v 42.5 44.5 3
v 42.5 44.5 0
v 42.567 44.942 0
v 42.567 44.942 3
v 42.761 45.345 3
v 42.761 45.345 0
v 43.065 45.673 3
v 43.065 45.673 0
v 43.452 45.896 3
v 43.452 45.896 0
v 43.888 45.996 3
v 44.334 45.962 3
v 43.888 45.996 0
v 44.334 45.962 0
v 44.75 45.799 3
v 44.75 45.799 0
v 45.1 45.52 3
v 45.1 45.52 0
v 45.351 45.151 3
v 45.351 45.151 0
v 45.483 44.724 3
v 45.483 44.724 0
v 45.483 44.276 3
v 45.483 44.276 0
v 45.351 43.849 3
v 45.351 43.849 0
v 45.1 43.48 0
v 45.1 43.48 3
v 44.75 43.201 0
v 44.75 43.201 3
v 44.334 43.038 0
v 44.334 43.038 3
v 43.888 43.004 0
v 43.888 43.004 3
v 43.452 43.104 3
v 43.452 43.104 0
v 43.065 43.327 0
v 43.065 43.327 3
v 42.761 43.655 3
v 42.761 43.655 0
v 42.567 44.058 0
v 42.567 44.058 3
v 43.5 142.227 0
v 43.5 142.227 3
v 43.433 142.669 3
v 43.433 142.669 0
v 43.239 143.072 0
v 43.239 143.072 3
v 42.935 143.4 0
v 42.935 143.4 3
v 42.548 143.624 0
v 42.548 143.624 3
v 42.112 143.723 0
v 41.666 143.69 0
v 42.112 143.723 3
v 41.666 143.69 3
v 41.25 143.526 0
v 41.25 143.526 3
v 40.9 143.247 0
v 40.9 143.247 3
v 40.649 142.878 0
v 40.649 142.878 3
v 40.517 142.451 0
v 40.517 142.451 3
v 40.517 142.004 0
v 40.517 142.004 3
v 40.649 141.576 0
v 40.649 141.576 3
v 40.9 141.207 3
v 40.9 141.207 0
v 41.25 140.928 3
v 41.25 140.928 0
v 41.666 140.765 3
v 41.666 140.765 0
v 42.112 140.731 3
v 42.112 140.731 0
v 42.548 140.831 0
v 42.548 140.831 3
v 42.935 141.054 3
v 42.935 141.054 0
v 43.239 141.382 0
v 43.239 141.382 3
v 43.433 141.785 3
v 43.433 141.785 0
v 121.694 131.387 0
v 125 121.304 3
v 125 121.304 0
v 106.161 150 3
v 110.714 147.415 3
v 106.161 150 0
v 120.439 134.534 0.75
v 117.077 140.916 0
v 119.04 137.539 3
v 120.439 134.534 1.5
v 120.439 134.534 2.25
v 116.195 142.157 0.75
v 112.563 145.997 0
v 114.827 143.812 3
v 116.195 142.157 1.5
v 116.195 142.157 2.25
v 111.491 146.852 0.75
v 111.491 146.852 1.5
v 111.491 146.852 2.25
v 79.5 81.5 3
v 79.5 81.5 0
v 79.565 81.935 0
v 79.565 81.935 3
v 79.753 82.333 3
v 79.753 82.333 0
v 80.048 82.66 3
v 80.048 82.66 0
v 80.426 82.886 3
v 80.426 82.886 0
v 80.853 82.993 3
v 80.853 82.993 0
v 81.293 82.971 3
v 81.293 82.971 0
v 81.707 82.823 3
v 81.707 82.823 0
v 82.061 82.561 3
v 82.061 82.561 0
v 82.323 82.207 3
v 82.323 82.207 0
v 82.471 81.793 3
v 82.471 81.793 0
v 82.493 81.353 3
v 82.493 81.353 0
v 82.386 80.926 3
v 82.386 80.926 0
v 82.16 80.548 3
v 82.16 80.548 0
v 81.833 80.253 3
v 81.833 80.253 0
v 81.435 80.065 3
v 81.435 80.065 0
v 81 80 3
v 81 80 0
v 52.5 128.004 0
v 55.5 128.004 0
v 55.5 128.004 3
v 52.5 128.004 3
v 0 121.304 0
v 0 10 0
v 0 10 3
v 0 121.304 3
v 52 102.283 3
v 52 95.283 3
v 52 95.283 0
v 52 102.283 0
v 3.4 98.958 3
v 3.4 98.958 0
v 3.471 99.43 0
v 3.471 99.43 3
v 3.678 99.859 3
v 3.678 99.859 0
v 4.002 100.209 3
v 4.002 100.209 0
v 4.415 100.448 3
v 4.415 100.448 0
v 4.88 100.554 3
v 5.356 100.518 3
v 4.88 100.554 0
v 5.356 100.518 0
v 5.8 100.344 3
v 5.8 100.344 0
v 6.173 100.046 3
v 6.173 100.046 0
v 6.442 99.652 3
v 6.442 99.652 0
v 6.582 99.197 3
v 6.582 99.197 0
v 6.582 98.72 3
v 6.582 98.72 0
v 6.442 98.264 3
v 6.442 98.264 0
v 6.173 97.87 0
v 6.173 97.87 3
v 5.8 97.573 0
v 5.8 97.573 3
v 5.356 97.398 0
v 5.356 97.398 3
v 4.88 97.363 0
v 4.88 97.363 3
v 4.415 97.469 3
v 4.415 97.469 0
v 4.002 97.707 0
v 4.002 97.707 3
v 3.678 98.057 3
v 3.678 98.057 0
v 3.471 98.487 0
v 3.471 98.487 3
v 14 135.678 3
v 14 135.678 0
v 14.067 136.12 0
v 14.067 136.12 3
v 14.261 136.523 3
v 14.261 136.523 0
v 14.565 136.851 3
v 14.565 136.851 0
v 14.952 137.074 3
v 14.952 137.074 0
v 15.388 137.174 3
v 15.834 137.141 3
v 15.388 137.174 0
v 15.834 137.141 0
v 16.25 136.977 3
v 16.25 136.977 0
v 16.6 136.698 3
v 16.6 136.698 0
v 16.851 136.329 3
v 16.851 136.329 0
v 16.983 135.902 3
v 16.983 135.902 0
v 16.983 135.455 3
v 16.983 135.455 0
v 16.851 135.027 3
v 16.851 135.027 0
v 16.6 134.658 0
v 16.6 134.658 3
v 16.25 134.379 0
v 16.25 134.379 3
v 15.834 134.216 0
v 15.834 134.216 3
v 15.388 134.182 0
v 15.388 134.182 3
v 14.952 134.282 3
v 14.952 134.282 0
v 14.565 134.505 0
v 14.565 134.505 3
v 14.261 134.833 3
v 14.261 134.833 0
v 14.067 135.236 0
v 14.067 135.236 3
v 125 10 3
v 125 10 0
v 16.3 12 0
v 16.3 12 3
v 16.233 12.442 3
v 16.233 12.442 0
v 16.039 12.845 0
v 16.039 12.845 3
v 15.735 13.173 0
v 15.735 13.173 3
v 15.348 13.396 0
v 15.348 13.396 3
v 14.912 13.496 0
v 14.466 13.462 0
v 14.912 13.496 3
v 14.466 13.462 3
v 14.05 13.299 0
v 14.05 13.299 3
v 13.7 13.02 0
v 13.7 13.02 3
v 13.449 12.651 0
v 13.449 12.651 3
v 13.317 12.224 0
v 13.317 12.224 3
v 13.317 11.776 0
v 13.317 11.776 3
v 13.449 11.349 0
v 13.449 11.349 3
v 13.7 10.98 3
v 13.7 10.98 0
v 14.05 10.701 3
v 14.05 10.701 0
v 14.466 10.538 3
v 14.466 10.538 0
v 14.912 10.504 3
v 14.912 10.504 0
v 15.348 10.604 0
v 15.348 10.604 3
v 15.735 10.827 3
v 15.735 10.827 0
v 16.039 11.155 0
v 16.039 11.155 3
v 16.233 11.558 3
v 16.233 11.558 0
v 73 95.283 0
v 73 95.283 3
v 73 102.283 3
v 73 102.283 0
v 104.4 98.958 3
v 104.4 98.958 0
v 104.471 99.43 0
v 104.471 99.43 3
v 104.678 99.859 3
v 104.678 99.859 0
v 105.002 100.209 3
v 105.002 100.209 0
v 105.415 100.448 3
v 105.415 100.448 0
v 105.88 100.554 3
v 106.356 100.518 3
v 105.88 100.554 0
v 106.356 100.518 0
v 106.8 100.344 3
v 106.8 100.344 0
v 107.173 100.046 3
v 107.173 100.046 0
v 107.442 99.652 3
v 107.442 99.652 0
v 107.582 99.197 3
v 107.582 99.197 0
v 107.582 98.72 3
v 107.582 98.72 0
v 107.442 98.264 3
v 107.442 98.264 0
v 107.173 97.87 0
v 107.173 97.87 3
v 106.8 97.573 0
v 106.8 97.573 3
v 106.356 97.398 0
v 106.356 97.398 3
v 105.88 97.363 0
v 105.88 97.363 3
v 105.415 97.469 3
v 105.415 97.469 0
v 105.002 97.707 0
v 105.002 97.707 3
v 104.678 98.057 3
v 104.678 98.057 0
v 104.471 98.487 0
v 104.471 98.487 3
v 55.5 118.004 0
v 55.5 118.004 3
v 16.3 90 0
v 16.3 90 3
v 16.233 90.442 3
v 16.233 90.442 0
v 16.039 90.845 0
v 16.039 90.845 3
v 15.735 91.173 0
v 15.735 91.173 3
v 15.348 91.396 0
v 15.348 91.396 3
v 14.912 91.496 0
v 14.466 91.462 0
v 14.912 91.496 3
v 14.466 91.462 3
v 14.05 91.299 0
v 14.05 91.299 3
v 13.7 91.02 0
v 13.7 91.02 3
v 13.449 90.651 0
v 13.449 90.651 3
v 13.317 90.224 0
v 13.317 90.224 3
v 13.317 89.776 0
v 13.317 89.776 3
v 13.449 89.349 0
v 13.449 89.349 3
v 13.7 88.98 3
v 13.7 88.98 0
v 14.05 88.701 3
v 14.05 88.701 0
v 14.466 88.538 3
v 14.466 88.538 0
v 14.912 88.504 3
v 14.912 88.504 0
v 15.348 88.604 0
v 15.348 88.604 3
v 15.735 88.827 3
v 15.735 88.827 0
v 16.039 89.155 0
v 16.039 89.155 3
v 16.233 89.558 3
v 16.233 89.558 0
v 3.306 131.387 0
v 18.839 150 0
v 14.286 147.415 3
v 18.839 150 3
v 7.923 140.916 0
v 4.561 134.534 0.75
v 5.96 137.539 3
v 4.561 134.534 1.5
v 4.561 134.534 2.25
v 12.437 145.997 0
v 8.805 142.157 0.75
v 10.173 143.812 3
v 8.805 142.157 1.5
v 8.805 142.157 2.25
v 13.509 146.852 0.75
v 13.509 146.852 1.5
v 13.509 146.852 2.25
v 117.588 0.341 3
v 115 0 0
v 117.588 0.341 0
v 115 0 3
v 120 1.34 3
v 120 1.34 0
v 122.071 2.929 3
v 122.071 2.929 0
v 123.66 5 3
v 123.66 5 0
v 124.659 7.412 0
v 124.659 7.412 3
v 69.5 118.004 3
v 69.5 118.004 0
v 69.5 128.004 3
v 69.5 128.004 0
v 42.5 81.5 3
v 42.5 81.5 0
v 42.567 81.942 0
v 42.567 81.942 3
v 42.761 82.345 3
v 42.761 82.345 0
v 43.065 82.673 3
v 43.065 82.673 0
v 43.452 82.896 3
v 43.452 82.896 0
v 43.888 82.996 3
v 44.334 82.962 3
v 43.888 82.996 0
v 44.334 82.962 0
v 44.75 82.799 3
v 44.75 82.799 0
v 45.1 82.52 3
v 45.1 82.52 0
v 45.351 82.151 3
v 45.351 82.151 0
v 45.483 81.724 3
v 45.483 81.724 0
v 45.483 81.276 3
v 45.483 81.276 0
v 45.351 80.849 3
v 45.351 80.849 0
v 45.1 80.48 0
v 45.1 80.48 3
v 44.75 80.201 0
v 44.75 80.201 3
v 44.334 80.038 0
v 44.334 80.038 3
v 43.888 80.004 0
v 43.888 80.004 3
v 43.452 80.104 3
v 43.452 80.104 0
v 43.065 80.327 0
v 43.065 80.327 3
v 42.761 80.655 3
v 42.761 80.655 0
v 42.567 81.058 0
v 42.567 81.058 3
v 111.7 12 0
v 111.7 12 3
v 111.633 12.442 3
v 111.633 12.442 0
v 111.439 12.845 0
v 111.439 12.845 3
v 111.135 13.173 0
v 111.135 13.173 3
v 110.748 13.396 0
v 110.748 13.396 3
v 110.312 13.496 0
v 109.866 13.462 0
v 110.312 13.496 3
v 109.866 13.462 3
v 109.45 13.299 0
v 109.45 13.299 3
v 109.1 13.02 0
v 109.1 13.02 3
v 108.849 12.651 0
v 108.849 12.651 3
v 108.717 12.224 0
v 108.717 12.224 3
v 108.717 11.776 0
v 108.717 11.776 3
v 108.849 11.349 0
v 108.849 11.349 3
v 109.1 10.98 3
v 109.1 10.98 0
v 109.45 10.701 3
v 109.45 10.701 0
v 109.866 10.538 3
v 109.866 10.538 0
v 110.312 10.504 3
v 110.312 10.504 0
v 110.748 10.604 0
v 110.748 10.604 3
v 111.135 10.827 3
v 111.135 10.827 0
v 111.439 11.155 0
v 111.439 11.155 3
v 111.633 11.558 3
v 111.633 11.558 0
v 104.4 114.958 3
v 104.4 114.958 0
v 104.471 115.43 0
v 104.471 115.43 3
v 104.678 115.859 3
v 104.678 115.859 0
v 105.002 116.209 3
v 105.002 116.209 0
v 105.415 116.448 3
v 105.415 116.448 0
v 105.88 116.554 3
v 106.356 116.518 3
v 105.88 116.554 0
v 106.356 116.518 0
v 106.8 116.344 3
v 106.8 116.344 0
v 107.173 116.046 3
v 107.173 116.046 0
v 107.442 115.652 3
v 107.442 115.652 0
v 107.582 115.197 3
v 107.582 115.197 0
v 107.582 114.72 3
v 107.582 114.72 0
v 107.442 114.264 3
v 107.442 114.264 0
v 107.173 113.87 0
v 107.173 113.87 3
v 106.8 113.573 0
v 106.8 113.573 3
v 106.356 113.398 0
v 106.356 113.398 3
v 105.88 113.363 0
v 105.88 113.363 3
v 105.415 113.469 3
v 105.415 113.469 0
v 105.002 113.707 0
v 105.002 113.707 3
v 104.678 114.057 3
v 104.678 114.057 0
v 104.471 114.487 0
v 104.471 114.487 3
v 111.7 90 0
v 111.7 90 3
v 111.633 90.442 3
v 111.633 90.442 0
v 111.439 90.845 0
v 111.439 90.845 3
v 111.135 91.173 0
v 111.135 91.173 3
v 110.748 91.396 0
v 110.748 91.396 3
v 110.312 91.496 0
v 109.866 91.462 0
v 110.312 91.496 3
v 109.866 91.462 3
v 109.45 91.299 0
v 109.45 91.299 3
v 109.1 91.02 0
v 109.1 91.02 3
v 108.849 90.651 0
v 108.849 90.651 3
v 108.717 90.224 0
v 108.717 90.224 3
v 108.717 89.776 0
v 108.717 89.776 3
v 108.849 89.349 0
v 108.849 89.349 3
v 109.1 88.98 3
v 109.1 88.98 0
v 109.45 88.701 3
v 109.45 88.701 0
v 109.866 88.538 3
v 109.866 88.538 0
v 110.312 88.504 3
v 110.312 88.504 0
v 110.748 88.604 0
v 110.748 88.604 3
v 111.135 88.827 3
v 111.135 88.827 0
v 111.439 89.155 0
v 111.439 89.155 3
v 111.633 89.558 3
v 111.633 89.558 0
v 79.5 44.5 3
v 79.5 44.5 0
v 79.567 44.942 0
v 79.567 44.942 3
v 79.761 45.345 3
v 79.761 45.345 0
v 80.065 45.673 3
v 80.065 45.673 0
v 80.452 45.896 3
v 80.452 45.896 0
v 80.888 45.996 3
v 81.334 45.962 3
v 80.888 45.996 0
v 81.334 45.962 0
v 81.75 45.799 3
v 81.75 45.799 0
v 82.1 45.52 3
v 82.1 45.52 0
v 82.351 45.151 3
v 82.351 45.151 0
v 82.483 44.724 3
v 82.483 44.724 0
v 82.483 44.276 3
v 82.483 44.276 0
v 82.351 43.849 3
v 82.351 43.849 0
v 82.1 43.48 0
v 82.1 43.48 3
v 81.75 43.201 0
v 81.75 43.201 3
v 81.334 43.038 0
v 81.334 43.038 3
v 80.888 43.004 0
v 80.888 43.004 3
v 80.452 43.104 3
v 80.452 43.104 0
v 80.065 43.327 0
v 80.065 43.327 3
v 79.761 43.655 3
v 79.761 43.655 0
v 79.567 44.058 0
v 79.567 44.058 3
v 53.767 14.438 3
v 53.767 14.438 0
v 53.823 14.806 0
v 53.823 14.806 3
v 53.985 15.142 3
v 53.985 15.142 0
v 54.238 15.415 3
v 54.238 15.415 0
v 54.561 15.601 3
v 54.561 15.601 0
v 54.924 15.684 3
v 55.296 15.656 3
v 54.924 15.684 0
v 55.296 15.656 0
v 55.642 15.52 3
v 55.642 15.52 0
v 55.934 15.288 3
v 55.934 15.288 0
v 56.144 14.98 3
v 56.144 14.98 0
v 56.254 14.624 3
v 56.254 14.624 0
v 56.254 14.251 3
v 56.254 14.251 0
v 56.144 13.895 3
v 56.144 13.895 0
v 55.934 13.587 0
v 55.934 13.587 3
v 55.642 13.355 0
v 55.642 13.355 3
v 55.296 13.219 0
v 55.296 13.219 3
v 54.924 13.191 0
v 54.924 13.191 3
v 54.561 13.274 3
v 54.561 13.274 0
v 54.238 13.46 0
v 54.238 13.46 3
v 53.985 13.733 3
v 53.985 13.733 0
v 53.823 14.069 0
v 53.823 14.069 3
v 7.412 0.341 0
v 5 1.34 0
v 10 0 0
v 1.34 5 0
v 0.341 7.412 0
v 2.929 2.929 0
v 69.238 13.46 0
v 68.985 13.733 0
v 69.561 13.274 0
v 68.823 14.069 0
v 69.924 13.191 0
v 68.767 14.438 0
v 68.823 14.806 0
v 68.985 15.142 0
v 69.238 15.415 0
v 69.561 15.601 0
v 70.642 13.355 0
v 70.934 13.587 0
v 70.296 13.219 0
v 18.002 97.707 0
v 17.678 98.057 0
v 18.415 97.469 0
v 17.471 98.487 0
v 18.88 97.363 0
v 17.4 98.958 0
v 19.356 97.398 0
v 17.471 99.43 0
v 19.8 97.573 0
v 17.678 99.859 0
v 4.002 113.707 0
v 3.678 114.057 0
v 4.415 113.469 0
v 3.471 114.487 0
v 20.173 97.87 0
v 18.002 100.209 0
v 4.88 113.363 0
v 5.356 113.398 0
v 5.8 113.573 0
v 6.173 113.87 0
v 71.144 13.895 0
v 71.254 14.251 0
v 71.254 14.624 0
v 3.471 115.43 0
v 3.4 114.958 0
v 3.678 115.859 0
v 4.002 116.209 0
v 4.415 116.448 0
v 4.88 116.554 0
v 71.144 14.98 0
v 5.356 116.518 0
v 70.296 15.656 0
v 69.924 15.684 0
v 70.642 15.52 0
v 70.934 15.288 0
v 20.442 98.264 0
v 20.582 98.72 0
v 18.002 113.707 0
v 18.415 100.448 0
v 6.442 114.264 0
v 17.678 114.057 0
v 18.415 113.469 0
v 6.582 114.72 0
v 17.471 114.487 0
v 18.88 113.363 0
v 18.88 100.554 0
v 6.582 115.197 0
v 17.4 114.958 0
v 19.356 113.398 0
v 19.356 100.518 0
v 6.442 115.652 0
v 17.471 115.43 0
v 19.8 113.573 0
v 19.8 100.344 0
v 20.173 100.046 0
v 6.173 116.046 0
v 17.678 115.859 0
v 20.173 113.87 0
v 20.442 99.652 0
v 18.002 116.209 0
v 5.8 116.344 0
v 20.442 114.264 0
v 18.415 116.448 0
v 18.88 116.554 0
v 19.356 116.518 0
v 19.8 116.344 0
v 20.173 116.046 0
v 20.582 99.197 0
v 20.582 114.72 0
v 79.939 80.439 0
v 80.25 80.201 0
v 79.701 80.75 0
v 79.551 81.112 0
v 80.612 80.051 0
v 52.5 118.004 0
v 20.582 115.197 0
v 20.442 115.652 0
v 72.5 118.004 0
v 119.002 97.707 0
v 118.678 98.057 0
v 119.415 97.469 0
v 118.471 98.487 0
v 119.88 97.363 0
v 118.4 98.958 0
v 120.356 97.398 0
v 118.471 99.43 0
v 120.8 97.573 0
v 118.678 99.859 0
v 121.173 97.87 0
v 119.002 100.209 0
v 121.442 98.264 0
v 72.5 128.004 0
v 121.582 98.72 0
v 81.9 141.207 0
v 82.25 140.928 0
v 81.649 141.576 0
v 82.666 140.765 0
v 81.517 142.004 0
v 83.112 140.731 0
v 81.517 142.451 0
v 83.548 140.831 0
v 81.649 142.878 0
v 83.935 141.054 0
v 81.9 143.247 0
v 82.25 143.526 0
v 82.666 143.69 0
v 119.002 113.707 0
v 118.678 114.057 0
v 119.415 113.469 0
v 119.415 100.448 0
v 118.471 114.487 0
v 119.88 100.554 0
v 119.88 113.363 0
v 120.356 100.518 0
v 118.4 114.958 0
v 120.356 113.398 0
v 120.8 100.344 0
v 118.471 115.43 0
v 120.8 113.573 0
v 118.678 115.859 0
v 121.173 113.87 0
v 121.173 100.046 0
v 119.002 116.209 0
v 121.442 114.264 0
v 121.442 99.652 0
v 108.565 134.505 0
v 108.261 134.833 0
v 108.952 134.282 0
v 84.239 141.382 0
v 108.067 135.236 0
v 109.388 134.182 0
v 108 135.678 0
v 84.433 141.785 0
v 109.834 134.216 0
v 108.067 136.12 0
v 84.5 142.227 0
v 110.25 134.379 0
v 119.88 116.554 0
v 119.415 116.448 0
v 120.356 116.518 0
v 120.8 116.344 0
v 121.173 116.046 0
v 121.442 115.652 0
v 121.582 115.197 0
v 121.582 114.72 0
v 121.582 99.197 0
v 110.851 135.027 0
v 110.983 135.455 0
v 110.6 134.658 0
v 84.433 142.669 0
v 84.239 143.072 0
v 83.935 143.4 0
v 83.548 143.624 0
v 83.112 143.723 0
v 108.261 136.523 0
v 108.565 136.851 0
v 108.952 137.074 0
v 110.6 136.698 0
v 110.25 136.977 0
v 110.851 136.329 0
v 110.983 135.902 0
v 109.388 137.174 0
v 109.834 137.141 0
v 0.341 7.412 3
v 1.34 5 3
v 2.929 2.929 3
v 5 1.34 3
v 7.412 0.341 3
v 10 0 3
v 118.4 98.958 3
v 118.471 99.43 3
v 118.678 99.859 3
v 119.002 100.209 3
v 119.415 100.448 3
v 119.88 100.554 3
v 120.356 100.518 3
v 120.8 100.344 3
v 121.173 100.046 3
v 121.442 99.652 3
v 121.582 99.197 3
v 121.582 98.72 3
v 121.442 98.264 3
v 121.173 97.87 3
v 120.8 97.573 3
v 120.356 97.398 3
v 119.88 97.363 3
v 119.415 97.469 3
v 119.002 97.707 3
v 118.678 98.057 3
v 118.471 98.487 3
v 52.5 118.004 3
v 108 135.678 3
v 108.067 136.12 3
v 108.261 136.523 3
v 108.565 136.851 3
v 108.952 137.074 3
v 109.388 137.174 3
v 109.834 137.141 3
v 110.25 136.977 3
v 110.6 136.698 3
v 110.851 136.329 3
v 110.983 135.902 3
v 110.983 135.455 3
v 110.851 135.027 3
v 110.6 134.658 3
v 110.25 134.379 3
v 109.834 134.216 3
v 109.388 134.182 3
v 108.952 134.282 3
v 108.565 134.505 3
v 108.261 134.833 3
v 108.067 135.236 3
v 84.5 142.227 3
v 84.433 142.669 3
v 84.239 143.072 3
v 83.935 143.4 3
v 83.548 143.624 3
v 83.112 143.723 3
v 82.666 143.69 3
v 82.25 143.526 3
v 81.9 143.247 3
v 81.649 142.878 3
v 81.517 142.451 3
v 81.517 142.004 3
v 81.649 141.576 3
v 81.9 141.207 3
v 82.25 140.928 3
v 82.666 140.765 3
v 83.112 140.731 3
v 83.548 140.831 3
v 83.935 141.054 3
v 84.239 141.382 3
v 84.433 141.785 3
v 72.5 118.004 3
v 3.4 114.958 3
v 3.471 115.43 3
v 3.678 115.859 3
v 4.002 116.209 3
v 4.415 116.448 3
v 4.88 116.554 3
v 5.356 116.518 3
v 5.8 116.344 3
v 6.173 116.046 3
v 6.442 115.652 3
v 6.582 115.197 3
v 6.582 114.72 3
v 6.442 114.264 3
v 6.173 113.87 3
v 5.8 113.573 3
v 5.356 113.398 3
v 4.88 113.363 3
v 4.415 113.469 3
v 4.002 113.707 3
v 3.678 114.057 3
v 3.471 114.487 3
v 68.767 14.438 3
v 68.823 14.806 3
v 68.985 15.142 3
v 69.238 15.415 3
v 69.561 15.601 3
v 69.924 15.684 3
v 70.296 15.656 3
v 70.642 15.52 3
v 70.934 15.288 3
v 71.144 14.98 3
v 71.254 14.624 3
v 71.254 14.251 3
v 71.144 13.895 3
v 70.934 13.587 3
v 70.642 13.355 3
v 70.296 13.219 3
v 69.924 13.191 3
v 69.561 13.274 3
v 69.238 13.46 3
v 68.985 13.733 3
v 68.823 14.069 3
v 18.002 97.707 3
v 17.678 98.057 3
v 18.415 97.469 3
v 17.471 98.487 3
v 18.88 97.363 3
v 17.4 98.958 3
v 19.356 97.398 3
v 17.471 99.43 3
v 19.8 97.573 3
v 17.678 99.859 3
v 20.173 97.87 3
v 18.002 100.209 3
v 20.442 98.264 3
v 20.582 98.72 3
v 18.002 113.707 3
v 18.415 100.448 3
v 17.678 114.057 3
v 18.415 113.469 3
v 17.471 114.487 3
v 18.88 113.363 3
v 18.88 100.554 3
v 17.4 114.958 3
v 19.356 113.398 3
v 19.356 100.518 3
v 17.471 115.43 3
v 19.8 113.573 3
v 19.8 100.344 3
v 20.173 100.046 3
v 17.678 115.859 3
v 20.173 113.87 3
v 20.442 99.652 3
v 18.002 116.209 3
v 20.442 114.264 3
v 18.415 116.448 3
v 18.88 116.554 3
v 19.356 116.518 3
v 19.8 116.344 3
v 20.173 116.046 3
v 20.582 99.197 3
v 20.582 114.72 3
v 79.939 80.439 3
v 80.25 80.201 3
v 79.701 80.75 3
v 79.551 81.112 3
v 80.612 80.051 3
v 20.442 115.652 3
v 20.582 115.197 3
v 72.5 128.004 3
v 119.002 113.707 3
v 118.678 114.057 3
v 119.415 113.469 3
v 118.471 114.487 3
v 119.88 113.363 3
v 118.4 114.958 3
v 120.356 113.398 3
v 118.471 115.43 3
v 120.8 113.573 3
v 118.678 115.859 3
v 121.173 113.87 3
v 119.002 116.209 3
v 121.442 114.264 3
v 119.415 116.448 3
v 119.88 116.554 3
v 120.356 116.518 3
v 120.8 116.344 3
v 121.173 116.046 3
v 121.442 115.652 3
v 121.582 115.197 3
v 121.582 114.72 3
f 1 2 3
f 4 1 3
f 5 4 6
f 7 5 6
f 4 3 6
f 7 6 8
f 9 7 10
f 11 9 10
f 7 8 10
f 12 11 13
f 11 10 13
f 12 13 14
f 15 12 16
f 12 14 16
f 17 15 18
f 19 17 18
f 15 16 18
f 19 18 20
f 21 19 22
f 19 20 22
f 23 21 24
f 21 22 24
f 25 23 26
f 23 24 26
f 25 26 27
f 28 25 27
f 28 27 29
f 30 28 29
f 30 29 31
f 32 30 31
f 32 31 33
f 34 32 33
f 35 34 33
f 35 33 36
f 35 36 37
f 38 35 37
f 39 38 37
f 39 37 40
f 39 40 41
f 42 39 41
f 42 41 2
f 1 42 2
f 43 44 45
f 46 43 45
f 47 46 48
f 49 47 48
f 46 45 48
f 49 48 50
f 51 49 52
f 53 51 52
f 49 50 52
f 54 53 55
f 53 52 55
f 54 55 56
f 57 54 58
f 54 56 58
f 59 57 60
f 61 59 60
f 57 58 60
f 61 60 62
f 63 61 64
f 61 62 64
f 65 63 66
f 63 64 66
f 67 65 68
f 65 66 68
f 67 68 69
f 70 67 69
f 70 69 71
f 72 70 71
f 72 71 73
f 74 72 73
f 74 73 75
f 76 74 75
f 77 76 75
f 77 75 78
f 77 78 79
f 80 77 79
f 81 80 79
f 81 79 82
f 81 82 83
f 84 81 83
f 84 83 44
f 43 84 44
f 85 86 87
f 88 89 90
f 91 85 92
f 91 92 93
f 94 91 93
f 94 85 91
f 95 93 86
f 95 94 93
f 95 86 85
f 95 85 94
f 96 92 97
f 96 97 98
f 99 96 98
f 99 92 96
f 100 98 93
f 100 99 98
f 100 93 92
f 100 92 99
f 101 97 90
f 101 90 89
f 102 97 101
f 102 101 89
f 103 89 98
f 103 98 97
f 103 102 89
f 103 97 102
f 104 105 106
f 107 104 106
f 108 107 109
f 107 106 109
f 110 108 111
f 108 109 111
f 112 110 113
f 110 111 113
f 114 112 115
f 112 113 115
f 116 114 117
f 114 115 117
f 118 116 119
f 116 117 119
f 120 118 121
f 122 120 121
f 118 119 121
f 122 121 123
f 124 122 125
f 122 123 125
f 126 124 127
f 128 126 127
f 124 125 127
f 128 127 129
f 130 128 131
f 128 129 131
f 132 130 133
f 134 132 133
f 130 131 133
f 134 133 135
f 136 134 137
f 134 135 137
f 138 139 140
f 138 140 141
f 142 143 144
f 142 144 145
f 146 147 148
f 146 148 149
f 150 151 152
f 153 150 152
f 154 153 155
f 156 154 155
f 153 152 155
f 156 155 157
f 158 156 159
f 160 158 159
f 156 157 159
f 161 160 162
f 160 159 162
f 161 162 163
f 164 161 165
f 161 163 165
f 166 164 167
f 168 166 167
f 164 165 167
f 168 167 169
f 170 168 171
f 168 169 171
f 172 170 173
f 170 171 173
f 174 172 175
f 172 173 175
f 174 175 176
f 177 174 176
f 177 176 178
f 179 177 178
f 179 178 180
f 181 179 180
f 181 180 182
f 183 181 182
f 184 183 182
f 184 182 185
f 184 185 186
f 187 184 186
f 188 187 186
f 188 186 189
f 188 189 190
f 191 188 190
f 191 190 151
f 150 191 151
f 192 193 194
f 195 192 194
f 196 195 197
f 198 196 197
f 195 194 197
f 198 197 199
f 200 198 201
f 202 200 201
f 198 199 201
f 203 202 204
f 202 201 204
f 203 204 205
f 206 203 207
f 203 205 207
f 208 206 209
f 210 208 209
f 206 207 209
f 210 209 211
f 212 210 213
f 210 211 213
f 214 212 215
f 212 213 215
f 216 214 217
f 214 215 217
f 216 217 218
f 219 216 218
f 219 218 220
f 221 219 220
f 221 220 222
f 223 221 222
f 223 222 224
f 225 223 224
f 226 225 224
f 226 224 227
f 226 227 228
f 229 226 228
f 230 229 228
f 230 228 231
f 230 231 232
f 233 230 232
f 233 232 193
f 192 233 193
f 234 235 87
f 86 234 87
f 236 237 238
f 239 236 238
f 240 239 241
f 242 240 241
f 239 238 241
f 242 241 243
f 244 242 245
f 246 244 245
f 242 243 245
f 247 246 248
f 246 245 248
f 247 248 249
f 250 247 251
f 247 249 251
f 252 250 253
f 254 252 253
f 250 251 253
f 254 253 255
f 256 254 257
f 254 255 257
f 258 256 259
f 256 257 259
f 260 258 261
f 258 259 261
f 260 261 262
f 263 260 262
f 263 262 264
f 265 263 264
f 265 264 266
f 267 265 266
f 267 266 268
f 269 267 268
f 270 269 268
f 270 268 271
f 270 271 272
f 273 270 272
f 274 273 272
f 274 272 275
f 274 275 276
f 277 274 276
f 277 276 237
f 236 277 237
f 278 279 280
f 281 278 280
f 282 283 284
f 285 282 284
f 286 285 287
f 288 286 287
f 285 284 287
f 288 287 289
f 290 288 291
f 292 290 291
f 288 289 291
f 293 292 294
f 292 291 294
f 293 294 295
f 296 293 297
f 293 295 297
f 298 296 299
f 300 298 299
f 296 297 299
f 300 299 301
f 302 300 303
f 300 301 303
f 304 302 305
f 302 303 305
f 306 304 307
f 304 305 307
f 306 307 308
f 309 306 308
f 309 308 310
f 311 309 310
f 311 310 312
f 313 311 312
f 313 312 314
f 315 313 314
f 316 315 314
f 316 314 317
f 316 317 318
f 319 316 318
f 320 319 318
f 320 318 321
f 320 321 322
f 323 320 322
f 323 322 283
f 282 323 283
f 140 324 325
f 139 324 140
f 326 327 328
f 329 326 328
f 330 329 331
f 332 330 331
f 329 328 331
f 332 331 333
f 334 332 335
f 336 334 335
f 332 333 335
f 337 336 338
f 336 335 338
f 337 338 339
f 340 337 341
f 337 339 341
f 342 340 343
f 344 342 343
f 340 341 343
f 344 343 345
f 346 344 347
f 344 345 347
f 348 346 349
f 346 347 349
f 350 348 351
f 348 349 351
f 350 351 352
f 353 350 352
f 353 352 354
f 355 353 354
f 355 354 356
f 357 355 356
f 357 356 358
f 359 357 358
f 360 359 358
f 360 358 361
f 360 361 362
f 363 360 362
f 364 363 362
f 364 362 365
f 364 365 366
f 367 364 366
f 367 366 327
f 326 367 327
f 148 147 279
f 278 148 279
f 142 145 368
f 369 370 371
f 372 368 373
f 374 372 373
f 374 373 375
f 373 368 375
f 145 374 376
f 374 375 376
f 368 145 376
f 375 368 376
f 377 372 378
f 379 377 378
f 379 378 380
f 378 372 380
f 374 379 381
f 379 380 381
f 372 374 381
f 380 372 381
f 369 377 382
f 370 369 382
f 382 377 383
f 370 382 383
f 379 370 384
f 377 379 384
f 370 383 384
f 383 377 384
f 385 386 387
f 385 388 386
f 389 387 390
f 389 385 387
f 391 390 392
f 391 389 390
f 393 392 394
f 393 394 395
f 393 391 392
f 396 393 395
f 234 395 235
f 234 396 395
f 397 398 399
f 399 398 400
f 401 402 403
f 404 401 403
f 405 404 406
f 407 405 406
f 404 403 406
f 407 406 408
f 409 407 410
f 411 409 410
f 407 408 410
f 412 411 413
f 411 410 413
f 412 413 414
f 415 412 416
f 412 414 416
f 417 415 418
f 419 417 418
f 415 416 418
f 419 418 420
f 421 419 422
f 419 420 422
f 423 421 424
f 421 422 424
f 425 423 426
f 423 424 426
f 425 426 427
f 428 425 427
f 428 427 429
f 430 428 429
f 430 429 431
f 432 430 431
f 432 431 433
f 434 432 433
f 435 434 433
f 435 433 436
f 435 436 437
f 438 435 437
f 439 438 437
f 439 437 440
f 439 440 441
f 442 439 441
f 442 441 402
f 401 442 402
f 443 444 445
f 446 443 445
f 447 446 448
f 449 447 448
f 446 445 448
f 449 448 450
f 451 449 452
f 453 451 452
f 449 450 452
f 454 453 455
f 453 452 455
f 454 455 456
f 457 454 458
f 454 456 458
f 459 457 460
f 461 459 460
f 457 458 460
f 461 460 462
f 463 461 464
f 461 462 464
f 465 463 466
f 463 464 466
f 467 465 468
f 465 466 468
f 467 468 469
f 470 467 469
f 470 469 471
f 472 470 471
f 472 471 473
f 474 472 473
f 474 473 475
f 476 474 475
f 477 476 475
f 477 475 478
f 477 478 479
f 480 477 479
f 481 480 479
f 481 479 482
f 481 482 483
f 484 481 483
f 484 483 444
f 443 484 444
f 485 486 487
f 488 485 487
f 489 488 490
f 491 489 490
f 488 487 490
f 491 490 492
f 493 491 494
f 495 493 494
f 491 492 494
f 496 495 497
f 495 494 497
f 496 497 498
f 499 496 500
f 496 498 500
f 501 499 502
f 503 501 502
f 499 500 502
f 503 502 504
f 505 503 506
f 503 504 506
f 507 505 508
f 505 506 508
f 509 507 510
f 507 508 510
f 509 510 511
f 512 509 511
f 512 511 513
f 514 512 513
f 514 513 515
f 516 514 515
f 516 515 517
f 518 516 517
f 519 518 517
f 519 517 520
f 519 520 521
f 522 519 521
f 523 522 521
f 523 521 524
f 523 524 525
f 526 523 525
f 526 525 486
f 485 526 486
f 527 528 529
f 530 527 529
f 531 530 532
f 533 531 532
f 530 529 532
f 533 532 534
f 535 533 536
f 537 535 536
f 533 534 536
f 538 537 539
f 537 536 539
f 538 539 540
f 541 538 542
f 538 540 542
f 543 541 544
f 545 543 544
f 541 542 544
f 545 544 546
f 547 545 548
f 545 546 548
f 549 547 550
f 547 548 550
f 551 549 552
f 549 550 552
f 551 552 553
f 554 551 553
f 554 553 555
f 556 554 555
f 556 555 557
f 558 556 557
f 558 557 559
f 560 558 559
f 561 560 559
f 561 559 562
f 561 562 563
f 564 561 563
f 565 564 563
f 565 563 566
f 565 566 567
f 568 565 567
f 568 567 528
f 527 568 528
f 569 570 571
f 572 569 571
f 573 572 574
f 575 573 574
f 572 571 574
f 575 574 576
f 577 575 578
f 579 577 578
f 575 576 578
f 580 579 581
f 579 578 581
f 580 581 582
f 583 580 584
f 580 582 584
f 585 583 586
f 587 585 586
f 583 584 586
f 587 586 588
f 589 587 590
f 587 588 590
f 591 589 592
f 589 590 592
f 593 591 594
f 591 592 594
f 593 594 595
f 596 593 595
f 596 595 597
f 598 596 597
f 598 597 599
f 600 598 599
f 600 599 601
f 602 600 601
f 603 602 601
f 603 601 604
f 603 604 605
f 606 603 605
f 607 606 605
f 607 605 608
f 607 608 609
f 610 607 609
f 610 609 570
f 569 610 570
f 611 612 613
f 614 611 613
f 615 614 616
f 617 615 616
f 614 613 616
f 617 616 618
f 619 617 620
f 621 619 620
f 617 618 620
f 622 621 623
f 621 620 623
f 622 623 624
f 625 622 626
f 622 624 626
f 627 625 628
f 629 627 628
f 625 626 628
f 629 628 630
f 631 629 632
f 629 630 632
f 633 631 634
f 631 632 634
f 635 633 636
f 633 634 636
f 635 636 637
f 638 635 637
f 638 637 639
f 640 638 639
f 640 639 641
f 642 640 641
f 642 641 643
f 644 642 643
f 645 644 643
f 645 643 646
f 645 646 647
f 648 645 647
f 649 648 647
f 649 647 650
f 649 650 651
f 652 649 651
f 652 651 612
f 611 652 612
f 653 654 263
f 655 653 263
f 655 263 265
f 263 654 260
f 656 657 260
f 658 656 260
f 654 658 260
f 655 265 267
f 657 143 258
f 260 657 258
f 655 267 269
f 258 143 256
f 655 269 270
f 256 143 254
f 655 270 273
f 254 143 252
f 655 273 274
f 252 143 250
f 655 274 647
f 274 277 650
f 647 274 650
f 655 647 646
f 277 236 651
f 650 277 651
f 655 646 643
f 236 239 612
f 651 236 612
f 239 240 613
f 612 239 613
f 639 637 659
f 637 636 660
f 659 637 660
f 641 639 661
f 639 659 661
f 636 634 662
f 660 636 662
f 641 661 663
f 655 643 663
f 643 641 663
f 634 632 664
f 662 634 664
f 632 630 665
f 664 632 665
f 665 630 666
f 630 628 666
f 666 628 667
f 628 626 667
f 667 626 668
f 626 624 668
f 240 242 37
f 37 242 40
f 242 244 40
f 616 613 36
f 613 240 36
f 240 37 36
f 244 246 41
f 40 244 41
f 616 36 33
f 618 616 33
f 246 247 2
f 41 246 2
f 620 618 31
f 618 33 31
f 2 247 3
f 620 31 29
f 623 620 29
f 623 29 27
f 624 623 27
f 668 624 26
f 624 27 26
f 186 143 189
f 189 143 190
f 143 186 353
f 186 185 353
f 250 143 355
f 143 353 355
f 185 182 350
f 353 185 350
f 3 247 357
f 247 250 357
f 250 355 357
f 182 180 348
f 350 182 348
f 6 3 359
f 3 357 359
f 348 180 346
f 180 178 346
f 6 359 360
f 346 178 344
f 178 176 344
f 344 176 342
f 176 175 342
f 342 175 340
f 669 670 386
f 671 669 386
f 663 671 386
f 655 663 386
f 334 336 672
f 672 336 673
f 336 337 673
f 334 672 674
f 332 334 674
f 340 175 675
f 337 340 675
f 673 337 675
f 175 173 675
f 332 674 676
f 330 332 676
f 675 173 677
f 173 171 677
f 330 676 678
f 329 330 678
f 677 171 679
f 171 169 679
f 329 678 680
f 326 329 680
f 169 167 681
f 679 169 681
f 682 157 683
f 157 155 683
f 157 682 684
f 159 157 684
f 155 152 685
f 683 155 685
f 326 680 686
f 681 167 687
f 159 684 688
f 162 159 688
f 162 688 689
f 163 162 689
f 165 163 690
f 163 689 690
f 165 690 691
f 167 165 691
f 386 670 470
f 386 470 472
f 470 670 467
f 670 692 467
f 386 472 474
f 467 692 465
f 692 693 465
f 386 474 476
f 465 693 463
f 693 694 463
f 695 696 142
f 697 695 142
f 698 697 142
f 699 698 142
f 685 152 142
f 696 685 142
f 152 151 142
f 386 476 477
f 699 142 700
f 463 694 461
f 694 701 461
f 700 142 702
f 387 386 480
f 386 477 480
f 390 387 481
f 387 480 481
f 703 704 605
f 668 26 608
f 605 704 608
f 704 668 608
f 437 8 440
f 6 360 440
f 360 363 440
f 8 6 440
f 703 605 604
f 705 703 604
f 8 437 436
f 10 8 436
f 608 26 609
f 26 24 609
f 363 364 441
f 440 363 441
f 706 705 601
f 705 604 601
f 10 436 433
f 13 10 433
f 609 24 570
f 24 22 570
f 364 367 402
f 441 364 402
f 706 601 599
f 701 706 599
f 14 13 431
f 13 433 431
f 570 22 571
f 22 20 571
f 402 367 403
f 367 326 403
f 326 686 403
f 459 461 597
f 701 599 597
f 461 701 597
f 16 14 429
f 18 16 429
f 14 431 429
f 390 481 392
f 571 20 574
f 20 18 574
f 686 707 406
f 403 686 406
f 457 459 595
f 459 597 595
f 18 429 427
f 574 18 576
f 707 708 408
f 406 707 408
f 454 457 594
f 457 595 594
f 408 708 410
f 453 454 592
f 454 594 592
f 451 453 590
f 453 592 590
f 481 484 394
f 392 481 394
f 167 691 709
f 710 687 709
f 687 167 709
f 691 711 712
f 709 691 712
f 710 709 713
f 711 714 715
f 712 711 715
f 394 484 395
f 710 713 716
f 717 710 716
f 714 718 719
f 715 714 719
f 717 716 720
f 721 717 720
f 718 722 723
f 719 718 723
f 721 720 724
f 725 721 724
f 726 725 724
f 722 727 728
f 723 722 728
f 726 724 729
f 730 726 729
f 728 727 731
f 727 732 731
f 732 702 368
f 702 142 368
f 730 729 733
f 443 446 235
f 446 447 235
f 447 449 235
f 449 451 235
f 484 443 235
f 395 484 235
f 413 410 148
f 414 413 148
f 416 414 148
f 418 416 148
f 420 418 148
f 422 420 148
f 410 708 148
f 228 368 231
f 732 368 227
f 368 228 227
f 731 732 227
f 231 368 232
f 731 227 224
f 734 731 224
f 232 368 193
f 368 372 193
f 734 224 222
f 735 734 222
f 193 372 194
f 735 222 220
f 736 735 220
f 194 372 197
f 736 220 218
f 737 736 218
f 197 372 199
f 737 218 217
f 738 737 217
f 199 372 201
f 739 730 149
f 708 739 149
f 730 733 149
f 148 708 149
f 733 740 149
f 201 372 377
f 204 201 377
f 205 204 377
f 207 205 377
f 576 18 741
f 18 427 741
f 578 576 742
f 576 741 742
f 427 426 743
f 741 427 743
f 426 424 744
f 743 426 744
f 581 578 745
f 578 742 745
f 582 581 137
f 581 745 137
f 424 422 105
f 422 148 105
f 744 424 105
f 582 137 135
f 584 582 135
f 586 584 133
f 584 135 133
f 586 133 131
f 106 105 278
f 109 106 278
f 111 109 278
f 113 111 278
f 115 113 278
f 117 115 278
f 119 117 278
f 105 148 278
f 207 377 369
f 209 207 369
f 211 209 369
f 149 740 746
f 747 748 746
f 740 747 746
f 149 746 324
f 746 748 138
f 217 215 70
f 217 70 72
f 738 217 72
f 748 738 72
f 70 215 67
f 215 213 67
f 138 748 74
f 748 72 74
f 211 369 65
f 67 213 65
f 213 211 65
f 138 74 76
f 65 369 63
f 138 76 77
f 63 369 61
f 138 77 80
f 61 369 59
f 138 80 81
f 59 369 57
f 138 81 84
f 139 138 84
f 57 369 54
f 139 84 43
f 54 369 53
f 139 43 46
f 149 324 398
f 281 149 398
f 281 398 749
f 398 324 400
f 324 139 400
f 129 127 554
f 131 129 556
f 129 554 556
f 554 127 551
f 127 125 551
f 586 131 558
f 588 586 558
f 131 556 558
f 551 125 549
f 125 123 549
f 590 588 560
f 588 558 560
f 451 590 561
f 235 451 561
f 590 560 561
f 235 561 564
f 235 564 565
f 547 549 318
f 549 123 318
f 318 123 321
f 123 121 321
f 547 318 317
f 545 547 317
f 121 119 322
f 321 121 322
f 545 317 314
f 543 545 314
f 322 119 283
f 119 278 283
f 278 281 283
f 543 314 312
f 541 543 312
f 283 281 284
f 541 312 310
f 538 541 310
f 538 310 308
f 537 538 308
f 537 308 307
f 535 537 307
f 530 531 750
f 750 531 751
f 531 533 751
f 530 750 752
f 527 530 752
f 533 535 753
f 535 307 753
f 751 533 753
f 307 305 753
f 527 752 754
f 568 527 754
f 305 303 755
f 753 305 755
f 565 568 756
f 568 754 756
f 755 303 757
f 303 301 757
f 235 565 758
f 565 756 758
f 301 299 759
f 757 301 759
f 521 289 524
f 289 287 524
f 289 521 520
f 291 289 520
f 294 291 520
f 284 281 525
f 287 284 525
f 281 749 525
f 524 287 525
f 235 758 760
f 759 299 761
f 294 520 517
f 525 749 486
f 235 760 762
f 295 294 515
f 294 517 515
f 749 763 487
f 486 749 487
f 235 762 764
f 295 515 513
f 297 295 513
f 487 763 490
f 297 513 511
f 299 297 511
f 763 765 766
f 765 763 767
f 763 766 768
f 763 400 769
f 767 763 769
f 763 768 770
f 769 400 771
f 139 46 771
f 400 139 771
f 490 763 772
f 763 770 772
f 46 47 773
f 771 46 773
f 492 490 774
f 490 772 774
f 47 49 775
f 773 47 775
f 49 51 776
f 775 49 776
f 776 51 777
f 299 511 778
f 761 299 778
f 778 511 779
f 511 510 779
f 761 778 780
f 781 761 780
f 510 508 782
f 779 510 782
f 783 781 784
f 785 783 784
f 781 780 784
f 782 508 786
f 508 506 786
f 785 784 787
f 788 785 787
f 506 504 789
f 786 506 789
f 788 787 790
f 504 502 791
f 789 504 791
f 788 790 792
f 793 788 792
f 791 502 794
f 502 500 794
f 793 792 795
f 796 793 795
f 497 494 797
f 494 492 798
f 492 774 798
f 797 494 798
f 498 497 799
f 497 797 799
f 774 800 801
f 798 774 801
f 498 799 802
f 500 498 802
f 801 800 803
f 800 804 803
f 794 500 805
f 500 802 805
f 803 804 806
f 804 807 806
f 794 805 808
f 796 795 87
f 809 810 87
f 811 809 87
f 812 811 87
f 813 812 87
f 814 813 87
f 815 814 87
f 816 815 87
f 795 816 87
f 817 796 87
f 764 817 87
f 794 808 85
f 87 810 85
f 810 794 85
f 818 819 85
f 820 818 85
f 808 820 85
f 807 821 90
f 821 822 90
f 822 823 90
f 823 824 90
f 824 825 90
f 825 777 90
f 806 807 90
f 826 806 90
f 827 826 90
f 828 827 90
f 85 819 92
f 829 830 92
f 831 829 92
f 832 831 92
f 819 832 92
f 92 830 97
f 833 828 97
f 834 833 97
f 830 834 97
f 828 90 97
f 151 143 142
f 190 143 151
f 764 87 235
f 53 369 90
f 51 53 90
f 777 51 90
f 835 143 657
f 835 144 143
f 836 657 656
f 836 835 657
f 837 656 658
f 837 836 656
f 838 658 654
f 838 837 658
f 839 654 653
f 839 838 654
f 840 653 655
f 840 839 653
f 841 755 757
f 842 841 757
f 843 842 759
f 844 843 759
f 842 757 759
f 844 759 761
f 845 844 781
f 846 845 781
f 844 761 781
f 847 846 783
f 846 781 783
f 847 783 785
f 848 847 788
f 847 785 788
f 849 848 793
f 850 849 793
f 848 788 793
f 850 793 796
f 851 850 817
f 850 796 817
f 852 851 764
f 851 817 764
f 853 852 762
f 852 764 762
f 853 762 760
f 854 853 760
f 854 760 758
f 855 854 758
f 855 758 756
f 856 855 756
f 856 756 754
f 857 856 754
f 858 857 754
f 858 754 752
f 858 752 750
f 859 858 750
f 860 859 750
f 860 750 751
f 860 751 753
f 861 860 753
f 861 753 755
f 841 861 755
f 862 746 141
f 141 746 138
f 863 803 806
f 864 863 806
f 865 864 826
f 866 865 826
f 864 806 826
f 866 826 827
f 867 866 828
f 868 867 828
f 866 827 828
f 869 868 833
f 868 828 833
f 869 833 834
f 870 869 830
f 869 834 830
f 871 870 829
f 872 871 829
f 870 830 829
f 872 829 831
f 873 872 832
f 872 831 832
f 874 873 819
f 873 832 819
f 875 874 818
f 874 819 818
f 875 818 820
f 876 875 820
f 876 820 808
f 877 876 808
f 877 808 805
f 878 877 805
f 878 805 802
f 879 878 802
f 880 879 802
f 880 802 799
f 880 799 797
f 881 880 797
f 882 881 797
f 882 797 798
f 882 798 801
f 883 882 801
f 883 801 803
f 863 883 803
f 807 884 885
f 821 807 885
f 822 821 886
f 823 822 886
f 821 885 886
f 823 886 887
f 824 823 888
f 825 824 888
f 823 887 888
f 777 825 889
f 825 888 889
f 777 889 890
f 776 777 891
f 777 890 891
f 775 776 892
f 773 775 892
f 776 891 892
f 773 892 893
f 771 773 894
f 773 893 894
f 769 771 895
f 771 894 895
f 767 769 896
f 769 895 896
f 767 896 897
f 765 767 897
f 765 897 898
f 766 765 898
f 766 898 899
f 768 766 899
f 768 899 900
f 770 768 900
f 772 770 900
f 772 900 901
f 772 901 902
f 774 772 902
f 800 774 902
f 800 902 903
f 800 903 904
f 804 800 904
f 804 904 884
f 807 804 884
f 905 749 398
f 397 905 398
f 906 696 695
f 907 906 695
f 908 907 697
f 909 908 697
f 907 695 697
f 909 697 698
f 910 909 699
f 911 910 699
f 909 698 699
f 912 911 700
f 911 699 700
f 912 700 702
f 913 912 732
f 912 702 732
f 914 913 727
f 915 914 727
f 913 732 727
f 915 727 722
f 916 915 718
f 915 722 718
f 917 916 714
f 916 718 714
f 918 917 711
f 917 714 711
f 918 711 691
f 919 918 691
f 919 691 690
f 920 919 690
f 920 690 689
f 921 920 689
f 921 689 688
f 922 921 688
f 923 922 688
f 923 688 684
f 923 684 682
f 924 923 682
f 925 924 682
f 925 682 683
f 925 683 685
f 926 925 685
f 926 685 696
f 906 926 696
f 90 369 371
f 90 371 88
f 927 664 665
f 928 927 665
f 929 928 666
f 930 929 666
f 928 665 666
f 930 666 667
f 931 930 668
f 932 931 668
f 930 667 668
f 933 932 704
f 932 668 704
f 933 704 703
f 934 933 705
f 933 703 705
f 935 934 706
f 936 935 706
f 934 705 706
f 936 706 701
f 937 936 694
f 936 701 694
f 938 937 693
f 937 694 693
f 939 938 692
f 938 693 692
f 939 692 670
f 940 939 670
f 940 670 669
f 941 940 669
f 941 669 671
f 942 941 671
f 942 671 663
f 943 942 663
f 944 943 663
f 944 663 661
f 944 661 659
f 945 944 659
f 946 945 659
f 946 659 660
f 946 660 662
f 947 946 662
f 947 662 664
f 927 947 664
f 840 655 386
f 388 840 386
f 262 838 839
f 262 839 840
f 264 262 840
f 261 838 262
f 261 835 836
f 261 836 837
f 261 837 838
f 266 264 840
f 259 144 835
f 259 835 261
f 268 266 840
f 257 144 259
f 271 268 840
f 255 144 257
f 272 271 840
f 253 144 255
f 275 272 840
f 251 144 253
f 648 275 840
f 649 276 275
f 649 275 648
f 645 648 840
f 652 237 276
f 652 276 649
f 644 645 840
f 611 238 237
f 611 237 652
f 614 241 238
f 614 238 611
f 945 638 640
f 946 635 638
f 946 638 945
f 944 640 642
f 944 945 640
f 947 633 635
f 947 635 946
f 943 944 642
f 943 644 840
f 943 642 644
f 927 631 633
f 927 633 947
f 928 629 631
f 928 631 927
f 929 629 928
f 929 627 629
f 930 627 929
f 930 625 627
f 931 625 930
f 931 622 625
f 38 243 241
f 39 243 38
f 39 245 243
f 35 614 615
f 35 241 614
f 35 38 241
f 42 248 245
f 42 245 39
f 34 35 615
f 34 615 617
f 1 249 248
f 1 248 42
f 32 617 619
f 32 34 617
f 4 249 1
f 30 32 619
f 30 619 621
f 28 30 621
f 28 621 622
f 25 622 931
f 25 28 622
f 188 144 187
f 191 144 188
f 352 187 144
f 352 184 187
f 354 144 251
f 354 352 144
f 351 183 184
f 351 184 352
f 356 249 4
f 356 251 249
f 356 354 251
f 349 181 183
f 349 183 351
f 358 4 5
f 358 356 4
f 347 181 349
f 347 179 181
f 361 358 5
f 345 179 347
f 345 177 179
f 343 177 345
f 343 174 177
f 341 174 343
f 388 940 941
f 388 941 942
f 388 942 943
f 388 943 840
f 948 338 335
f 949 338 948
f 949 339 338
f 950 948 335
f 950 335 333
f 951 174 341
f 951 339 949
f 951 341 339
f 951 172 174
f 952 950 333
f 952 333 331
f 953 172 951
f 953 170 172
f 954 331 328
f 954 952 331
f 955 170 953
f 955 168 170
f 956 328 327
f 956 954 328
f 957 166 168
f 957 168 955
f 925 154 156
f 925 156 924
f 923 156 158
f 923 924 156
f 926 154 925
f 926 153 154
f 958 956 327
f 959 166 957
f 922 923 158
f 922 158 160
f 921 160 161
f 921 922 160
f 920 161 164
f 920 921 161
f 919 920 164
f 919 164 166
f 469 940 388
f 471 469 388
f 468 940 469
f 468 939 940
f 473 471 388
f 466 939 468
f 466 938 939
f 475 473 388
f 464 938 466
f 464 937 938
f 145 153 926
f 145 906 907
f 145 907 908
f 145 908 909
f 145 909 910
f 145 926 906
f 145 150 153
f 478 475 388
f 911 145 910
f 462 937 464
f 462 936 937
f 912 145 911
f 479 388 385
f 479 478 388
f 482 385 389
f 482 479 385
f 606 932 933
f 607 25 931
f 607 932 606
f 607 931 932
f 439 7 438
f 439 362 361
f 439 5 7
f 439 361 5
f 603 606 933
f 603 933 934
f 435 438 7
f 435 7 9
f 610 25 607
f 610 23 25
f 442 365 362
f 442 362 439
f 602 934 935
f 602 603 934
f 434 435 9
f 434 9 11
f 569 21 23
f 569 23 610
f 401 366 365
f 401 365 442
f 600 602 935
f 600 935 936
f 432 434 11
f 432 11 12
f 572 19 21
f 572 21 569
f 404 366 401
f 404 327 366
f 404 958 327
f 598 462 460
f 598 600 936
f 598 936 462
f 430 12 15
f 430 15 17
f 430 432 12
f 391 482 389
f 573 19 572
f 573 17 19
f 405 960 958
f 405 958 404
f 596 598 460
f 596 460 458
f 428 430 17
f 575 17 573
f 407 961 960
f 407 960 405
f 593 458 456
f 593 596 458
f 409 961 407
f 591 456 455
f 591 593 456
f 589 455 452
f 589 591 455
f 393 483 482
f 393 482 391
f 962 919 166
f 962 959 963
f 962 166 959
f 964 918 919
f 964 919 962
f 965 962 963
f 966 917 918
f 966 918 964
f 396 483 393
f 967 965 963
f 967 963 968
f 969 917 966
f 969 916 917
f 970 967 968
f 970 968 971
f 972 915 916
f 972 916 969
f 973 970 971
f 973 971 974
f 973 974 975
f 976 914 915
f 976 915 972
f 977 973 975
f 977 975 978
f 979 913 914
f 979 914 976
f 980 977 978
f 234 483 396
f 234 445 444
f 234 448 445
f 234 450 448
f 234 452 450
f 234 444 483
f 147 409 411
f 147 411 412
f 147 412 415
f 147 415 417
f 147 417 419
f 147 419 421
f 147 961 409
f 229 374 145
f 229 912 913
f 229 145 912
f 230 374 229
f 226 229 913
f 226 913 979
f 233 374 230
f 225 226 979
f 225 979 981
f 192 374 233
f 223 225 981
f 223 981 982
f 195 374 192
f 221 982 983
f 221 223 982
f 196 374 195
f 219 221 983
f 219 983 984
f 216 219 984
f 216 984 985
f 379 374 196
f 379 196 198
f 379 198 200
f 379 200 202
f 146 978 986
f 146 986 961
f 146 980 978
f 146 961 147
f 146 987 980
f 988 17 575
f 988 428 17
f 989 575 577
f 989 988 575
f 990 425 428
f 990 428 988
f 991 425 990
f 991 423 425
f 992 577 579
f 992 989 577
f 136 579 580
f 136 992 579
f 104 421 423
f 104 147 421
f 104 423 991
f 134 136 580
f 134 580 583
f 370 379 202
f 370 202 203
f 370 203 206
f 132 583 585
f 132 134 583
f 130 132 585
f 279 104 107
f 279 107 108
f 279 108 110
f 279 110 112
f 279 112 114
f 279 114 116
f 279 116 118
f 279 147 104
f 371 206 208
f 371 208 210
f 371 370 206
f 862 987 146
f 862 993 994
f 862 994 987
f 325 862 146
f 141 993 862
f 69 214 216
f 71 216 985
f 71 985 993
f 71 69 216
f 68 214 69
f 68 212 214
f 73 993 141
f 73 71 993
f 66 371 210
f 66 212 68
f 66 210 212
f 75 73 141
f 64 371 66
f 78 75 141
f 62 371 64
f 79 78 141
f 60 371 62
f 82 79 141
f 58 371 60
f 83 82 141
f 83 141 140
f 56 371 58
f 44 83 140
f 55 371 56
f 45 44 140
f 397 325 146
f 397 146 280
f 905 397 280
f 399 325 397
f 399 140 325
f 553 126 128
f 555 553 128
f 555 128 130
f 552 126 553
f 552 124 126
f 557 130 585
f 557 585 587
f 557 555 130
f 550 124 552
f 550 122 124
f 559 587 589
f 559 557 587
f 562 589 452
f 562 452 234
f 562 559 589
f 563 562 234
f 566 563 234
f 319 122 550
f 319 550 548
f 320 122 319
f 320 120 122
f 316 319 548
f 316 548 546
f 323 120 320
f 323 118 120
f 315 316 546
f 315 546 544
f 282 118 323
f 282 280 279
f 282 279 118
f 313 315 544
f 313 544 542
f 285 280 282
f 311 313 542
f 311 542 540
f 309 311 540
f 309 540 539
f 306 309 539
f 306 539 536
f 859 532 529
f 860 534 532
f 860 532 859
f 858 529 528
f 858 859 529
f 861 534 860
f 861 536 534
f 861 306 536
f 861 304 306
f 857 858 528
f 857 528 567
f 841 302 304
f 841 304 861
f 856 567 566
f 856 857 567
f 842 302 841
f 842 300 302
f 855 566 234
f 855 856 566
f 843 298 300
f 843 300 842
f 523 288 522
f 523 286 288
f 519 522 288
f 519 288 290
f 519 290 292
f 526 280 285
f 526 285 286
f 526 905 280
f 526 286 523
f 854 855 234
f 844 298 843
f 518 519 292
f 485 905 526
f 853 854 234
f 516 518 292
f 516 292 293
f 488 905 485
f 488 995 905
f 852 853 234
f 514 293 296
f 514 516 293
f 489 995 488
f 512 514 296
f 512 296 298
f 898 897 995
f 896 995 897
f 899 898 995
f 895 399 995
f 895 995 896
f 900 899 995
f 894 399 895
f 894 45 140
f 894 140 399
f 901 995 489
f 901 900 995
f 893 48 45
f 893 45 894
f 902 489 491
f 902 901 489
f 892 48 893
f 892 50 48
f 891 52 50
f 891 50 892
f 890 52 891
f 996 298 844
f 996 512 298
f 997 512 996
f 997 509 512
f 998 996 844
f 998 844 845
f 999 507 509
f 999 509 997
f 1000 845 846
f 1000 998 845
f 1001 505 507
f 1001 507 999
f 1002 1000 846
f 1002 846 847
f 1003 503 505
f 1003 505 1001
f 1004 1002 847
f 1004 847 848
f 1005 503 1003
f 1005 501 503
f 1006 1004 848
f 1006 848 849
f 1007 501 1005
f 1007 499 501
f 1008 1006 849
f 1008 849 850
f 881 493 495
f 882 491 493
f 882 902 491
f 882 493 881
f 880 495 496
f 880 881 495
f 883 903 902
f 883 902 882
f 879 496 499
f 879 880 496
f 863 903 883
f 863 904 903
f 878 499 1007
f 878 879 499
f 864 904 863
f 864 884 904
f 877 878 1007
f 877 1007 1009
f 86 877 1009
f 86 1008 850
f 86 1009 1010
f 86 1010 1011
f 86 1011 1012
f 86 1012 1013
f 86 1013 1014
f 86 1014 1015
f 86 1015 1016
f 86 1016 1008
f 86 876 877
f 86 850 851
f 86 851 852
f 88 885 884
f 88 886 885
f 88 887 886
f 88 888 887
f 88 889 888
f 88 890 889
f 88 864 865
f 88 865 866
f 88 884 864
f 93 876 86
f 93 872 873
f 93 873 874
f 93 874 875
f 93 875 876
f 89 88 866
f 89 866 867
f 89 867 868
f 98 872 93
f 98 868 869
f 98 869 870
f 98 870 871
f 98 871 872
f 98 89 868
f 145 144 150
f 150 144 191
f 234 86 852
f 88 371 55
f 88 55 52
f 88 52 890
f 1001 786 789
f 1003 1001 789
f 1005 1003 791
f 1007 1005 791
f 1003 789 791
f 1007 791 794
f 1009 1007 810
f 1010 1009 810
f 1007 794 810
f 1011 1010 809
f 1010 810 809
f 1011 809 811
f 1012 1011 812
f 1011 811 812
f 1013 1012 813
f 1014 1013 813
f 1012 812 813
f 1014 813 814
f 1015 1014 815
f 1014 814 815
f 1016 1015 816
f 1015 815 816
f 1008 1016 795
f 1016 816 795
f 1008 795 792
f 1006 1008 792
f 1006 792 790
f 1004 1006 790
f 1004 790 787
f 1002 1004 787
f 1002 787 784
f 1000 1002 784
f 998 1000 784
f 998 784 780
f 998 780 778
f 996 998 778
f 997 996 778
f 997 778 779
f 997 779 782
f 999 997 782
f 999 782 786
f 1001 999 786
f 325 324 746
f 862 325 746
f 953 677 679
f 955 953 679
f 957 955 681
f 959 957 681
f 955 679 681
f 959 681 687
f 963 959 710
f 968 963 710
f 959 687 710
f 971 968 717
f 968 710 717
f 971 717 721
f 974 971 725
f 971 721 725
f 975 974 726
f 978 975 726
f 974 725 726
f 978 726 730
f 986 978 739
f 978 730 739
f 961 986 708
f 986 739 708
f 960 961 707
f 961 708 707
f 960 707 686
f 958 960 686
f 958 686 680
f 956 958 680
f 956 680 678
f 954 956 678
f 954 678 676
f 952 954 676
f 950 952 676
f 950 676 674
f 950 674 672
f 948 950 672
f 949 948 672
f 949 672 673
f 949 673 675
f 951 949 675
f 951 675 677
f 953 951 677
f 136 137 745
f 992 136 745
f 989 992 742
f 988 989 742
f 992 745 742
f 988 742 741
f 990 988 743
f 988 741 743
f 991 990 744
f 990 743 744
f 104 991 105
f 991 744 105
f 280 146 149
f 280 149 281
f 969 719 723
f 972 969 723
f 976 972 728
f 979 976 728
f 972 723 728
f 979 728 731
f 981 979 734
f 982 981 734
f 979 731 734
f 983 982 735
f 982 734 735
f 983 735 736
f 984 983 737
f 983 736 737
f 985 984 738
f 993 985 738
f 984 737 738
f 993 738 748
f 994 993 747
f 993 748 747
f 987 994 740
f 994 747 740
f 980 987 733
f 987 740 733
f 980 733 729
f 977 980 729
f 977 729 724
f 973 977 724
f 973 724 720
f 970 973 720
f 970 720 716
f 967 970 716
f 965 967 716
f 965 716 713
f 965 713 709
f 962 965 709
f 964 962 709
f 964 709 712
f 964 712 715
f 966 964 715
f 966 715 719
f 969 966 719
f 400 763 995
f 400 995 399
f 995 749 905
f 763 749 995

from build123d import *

# Parameters (mm, degrees)
SKETCH1_W           = 125
SKETCH1_H           = 150
BOSS_EXTRUDE1_DEPTH = 3
SKETCH2_R           = 1.6
CUT_EXTRUDE1_DEPTH  = 4
SKETCH3_R           = 1.5
CUT_EXTRUDE2_DEPTH  = 4
SKETCH4_R           = 1.25
CUT_EXTRUDE3_DEPTH  = 4
SKETCH5_W           = 3
SKETCH5_H           = 10
CUT_EXTRUDE4_DEPTH  = 4
SKETCH6_R           = 1.5
CUT_EXTRUDE5_DEPTH  = 4
CUT_EXTRUDE6_DEPTH  = 4
SKETCH8_R           = 1.5
CUT_EXTRUDE7_DEPTH  = 4.0000001
SKETCH9_R           = 1.5
CUT_EXTRUDE8_DEPTH  = 4.0000001
FILLET3_R           = 10
SKETCH10_W          = 21
SKETCH10_H          = 7
CUT_EXTRUDE9_DEPTH  = 4.0000001


with BuildPart() as part:
    # Sketch1 → Boss-Extrude1 (new body)
    with BuildSketch(Plane.XY):
        with Locations((62.5, 75)):
            Rectangle(SKETCH1_W, SKETCH1_H)
    extrude(amount=BOSS_EXTRUDE1_DEPTH)

    # Sketch2 → Cut-Extrude1 (cut, through all)
    with BuildSketch(Plane(origin=(0, 0, 0), x_dir=(-1, 0, 0), z_dir=(0, 0, -1))):
        with Locations((-120, 114.958148689)):
            Circle(SKETCH2_R)
        with Locations((-106, 114.958148689)):
            Circle(SKETCH2_R)
        with Locations((-106, 98.958148689)):
            Circle(SKETCH2_R)
        with Locations((-120, 98.958148689)):
            Circle(SKETCH2_R)
        with Locations((-19, 114.958148689)):
            Circle(SKETCH2_R)
        with Locations((-5, 114.958148689)):
            Circle(SKETCH2_R)
        with Locations((-5, 98.958148689)):
            Circle(SKETCH2_R)
        with Locations((-19, 98.958148689)):
            Circle(SKETCH2_R)
    extrude(amount=-CUT_EXTRUDE1_DEPTH, mode=Mode.SUBTRACT)

    # Sketch3 → Cut-Extrude2 (cut, through all)
    with BuildSketch(Plane(origin=(0, 0, 0), x_dir=(-1, 0, 0), z_dir=(0, 0, -1))):
        with BuildLine():
            ThreePointArc((-79.5, 81.5), (-82.060660172, 82.560660172), (-81, 80))
            Line((-81, 80), (-81, 81.5))
            Line((-81, 81.5), (-79.5, 81.5))
        make_face()
        with BuildLine():
            Line((-81, 81.5), (-81, 80))
            ThreePointArc((-81, 80), (-79.939339828, 80.439339828), (-79.5, 81.5))
            Line((-79.5, 81.5), (-81, 81.5))
        make_face()
        with Locations((-44, 81.5)):
            Circle(SKETCH3_R)
        with Locations((-81, 44.5)):
            Circle(SKETCH3_R)
        with Locations((-44, 44.5)):
            Circle(SKETCH3_R)
    extrude(amount=-CUT_EXTRUDE2_DEPTH, mode=Mode.SUBTRACT)

    # Sketch4 → Cut-Extrude3 (cut, through all)
    with BuildSketch(Plane(origin=(0, 0, 0), x_dir=(-1, 0, 0), z_dir=(0, 0, -1))):
        with Locations((-70.017473816, 14.43752637)):
            Circle(SKETCH4_R)
        with Locations((-55.017473816, 14.43752637)):
            Circle(SKETCH4_R)
    extrude(amount=-CUT_EXTRUDE3_DEPTH, mode=Mode.SUBTRACT)

    # Sketch5 → Cut-Extrude4 (cut, through all)
    with BuildSketch(Plane(origin=(0, 0, 0), x_dir=(-1, 0, 0), z_dir=(0, 0, -1))):
        with Locations((-54, 123.004295886)):
            Rectangle(SKETCH5_W, SKETCH5_H)
        with Locations((-71, 123.004295886)):
            Rectangle(SKETCH5_W, SKETCH5_H)
    extrude(amount=-CUT_EXTRUDE4_DEPTH, mode=Mode.SUBTRACT)

    # Sketch6 → Cut-Extrude5 (cut, through all)
    with BuildSketch(Plane(origin=(0, 0, 0), x_dir=(-1, 0, 0), z_dir=(0, 0, -1))):
        with Locations((-15.5, 135.678181118)):
            Circle(SKETCH6_R)
        with Locations((-109.5, 135.678181118)):
            Circle(SKETCH6_R)
    extrude(amount=-CUT_EXTRUDE5_DEPTH, mode=Mode.SUBTRACT)

    # Sketch7 → Cut-Extrude6 (cut, through all)
    with BuildSketch(Plane.XY.offset(3)):
        with BuildLine():
            Line((18.83856041, 150), (0, 150))
            Line((0, 150), (0, 121.303805561))
            add(Edge.make_bspline(
                [(0, 121.303805561), (5.130729703, 138.554109372), (8.057120528, 143.174726465), (13.293819899, 147.487302418), (18.83856041, 150)],
                knots=[0, 0, 0, 0, 0, 1, 1, 1, 1, 1], degree=4))
        make_face()
        with BuildLine():
            Line((125, 150), (125, 121.303805561))
            add(Edge.make_bspline(
                [(125, 121.303805561), (119.869270297, 138.554109372), (116.942879472, 143.174726465), (111.706180101, 147.487302418), (106.16143959, 150)],
                knots=[0, 0, 0, 0, 0, 1, 1, 1, 1, 1], degree=4))
            Line((106.16143959, 150), (125, 150))
        make_face()
    extrude(amount=-CUT_EXTRUDE6_DEPTH, mode=Mode.SUBTRACT)

    # Sketch8 → Cut-Extrude7 (cut, through all)
    with BuildSketch(Plane.XY.offset(3)):
        with Locations((14.8, 12)):
            Circle(SKETCH8_R)
        with Locations((110.2, 12)):
            Circle(SKETCH8_R)
        with Locations((14.8, 90)):
            Circle(SKETCH8_R)
        with Locations((110.2, 90)):
            Circle(SKETCH8_R)
    extrude(amount=-CUT_EXTRUDE7_DEPTH, mode=Mode.SUBTRACT)

    # Sketch9 → Cut-Extrude8 (cut, through all)
    with BuildSketch(Plane.XY.offset(3)):
        with Locations((42, 142.227223386)):
            Circle(SKETCH9_R)
        with Locations((83, 142.227223386)):
            Circle(SKETCH9_R)
    extrude(amount=-CUT_EXTRUDE8_DEPTH, mode=Mode.SUBTRACT)

    # Fillet3
    fillet3_edges = [part.edges().sort_by_distance(p)[0] for p in [
        (125, 0, 1.5),
        (0, 0, 1.5),
    ]]
    fillet(fillet3_edges, radius=FILLET3_R)

    # Sketch10 → Cut-Extrude9 (cut, through all)
    with BuildSketch(Plane.XY.offset(3)):
        with Locations((62.5, 98.783094858)):
            Rectangle(SKETCH10_W, SKETCH10_H)
    extrude(amount=-CUT_EXTRUDE9_DEPTH, mode=Mode.SUBTRACT)


solid = part.part
